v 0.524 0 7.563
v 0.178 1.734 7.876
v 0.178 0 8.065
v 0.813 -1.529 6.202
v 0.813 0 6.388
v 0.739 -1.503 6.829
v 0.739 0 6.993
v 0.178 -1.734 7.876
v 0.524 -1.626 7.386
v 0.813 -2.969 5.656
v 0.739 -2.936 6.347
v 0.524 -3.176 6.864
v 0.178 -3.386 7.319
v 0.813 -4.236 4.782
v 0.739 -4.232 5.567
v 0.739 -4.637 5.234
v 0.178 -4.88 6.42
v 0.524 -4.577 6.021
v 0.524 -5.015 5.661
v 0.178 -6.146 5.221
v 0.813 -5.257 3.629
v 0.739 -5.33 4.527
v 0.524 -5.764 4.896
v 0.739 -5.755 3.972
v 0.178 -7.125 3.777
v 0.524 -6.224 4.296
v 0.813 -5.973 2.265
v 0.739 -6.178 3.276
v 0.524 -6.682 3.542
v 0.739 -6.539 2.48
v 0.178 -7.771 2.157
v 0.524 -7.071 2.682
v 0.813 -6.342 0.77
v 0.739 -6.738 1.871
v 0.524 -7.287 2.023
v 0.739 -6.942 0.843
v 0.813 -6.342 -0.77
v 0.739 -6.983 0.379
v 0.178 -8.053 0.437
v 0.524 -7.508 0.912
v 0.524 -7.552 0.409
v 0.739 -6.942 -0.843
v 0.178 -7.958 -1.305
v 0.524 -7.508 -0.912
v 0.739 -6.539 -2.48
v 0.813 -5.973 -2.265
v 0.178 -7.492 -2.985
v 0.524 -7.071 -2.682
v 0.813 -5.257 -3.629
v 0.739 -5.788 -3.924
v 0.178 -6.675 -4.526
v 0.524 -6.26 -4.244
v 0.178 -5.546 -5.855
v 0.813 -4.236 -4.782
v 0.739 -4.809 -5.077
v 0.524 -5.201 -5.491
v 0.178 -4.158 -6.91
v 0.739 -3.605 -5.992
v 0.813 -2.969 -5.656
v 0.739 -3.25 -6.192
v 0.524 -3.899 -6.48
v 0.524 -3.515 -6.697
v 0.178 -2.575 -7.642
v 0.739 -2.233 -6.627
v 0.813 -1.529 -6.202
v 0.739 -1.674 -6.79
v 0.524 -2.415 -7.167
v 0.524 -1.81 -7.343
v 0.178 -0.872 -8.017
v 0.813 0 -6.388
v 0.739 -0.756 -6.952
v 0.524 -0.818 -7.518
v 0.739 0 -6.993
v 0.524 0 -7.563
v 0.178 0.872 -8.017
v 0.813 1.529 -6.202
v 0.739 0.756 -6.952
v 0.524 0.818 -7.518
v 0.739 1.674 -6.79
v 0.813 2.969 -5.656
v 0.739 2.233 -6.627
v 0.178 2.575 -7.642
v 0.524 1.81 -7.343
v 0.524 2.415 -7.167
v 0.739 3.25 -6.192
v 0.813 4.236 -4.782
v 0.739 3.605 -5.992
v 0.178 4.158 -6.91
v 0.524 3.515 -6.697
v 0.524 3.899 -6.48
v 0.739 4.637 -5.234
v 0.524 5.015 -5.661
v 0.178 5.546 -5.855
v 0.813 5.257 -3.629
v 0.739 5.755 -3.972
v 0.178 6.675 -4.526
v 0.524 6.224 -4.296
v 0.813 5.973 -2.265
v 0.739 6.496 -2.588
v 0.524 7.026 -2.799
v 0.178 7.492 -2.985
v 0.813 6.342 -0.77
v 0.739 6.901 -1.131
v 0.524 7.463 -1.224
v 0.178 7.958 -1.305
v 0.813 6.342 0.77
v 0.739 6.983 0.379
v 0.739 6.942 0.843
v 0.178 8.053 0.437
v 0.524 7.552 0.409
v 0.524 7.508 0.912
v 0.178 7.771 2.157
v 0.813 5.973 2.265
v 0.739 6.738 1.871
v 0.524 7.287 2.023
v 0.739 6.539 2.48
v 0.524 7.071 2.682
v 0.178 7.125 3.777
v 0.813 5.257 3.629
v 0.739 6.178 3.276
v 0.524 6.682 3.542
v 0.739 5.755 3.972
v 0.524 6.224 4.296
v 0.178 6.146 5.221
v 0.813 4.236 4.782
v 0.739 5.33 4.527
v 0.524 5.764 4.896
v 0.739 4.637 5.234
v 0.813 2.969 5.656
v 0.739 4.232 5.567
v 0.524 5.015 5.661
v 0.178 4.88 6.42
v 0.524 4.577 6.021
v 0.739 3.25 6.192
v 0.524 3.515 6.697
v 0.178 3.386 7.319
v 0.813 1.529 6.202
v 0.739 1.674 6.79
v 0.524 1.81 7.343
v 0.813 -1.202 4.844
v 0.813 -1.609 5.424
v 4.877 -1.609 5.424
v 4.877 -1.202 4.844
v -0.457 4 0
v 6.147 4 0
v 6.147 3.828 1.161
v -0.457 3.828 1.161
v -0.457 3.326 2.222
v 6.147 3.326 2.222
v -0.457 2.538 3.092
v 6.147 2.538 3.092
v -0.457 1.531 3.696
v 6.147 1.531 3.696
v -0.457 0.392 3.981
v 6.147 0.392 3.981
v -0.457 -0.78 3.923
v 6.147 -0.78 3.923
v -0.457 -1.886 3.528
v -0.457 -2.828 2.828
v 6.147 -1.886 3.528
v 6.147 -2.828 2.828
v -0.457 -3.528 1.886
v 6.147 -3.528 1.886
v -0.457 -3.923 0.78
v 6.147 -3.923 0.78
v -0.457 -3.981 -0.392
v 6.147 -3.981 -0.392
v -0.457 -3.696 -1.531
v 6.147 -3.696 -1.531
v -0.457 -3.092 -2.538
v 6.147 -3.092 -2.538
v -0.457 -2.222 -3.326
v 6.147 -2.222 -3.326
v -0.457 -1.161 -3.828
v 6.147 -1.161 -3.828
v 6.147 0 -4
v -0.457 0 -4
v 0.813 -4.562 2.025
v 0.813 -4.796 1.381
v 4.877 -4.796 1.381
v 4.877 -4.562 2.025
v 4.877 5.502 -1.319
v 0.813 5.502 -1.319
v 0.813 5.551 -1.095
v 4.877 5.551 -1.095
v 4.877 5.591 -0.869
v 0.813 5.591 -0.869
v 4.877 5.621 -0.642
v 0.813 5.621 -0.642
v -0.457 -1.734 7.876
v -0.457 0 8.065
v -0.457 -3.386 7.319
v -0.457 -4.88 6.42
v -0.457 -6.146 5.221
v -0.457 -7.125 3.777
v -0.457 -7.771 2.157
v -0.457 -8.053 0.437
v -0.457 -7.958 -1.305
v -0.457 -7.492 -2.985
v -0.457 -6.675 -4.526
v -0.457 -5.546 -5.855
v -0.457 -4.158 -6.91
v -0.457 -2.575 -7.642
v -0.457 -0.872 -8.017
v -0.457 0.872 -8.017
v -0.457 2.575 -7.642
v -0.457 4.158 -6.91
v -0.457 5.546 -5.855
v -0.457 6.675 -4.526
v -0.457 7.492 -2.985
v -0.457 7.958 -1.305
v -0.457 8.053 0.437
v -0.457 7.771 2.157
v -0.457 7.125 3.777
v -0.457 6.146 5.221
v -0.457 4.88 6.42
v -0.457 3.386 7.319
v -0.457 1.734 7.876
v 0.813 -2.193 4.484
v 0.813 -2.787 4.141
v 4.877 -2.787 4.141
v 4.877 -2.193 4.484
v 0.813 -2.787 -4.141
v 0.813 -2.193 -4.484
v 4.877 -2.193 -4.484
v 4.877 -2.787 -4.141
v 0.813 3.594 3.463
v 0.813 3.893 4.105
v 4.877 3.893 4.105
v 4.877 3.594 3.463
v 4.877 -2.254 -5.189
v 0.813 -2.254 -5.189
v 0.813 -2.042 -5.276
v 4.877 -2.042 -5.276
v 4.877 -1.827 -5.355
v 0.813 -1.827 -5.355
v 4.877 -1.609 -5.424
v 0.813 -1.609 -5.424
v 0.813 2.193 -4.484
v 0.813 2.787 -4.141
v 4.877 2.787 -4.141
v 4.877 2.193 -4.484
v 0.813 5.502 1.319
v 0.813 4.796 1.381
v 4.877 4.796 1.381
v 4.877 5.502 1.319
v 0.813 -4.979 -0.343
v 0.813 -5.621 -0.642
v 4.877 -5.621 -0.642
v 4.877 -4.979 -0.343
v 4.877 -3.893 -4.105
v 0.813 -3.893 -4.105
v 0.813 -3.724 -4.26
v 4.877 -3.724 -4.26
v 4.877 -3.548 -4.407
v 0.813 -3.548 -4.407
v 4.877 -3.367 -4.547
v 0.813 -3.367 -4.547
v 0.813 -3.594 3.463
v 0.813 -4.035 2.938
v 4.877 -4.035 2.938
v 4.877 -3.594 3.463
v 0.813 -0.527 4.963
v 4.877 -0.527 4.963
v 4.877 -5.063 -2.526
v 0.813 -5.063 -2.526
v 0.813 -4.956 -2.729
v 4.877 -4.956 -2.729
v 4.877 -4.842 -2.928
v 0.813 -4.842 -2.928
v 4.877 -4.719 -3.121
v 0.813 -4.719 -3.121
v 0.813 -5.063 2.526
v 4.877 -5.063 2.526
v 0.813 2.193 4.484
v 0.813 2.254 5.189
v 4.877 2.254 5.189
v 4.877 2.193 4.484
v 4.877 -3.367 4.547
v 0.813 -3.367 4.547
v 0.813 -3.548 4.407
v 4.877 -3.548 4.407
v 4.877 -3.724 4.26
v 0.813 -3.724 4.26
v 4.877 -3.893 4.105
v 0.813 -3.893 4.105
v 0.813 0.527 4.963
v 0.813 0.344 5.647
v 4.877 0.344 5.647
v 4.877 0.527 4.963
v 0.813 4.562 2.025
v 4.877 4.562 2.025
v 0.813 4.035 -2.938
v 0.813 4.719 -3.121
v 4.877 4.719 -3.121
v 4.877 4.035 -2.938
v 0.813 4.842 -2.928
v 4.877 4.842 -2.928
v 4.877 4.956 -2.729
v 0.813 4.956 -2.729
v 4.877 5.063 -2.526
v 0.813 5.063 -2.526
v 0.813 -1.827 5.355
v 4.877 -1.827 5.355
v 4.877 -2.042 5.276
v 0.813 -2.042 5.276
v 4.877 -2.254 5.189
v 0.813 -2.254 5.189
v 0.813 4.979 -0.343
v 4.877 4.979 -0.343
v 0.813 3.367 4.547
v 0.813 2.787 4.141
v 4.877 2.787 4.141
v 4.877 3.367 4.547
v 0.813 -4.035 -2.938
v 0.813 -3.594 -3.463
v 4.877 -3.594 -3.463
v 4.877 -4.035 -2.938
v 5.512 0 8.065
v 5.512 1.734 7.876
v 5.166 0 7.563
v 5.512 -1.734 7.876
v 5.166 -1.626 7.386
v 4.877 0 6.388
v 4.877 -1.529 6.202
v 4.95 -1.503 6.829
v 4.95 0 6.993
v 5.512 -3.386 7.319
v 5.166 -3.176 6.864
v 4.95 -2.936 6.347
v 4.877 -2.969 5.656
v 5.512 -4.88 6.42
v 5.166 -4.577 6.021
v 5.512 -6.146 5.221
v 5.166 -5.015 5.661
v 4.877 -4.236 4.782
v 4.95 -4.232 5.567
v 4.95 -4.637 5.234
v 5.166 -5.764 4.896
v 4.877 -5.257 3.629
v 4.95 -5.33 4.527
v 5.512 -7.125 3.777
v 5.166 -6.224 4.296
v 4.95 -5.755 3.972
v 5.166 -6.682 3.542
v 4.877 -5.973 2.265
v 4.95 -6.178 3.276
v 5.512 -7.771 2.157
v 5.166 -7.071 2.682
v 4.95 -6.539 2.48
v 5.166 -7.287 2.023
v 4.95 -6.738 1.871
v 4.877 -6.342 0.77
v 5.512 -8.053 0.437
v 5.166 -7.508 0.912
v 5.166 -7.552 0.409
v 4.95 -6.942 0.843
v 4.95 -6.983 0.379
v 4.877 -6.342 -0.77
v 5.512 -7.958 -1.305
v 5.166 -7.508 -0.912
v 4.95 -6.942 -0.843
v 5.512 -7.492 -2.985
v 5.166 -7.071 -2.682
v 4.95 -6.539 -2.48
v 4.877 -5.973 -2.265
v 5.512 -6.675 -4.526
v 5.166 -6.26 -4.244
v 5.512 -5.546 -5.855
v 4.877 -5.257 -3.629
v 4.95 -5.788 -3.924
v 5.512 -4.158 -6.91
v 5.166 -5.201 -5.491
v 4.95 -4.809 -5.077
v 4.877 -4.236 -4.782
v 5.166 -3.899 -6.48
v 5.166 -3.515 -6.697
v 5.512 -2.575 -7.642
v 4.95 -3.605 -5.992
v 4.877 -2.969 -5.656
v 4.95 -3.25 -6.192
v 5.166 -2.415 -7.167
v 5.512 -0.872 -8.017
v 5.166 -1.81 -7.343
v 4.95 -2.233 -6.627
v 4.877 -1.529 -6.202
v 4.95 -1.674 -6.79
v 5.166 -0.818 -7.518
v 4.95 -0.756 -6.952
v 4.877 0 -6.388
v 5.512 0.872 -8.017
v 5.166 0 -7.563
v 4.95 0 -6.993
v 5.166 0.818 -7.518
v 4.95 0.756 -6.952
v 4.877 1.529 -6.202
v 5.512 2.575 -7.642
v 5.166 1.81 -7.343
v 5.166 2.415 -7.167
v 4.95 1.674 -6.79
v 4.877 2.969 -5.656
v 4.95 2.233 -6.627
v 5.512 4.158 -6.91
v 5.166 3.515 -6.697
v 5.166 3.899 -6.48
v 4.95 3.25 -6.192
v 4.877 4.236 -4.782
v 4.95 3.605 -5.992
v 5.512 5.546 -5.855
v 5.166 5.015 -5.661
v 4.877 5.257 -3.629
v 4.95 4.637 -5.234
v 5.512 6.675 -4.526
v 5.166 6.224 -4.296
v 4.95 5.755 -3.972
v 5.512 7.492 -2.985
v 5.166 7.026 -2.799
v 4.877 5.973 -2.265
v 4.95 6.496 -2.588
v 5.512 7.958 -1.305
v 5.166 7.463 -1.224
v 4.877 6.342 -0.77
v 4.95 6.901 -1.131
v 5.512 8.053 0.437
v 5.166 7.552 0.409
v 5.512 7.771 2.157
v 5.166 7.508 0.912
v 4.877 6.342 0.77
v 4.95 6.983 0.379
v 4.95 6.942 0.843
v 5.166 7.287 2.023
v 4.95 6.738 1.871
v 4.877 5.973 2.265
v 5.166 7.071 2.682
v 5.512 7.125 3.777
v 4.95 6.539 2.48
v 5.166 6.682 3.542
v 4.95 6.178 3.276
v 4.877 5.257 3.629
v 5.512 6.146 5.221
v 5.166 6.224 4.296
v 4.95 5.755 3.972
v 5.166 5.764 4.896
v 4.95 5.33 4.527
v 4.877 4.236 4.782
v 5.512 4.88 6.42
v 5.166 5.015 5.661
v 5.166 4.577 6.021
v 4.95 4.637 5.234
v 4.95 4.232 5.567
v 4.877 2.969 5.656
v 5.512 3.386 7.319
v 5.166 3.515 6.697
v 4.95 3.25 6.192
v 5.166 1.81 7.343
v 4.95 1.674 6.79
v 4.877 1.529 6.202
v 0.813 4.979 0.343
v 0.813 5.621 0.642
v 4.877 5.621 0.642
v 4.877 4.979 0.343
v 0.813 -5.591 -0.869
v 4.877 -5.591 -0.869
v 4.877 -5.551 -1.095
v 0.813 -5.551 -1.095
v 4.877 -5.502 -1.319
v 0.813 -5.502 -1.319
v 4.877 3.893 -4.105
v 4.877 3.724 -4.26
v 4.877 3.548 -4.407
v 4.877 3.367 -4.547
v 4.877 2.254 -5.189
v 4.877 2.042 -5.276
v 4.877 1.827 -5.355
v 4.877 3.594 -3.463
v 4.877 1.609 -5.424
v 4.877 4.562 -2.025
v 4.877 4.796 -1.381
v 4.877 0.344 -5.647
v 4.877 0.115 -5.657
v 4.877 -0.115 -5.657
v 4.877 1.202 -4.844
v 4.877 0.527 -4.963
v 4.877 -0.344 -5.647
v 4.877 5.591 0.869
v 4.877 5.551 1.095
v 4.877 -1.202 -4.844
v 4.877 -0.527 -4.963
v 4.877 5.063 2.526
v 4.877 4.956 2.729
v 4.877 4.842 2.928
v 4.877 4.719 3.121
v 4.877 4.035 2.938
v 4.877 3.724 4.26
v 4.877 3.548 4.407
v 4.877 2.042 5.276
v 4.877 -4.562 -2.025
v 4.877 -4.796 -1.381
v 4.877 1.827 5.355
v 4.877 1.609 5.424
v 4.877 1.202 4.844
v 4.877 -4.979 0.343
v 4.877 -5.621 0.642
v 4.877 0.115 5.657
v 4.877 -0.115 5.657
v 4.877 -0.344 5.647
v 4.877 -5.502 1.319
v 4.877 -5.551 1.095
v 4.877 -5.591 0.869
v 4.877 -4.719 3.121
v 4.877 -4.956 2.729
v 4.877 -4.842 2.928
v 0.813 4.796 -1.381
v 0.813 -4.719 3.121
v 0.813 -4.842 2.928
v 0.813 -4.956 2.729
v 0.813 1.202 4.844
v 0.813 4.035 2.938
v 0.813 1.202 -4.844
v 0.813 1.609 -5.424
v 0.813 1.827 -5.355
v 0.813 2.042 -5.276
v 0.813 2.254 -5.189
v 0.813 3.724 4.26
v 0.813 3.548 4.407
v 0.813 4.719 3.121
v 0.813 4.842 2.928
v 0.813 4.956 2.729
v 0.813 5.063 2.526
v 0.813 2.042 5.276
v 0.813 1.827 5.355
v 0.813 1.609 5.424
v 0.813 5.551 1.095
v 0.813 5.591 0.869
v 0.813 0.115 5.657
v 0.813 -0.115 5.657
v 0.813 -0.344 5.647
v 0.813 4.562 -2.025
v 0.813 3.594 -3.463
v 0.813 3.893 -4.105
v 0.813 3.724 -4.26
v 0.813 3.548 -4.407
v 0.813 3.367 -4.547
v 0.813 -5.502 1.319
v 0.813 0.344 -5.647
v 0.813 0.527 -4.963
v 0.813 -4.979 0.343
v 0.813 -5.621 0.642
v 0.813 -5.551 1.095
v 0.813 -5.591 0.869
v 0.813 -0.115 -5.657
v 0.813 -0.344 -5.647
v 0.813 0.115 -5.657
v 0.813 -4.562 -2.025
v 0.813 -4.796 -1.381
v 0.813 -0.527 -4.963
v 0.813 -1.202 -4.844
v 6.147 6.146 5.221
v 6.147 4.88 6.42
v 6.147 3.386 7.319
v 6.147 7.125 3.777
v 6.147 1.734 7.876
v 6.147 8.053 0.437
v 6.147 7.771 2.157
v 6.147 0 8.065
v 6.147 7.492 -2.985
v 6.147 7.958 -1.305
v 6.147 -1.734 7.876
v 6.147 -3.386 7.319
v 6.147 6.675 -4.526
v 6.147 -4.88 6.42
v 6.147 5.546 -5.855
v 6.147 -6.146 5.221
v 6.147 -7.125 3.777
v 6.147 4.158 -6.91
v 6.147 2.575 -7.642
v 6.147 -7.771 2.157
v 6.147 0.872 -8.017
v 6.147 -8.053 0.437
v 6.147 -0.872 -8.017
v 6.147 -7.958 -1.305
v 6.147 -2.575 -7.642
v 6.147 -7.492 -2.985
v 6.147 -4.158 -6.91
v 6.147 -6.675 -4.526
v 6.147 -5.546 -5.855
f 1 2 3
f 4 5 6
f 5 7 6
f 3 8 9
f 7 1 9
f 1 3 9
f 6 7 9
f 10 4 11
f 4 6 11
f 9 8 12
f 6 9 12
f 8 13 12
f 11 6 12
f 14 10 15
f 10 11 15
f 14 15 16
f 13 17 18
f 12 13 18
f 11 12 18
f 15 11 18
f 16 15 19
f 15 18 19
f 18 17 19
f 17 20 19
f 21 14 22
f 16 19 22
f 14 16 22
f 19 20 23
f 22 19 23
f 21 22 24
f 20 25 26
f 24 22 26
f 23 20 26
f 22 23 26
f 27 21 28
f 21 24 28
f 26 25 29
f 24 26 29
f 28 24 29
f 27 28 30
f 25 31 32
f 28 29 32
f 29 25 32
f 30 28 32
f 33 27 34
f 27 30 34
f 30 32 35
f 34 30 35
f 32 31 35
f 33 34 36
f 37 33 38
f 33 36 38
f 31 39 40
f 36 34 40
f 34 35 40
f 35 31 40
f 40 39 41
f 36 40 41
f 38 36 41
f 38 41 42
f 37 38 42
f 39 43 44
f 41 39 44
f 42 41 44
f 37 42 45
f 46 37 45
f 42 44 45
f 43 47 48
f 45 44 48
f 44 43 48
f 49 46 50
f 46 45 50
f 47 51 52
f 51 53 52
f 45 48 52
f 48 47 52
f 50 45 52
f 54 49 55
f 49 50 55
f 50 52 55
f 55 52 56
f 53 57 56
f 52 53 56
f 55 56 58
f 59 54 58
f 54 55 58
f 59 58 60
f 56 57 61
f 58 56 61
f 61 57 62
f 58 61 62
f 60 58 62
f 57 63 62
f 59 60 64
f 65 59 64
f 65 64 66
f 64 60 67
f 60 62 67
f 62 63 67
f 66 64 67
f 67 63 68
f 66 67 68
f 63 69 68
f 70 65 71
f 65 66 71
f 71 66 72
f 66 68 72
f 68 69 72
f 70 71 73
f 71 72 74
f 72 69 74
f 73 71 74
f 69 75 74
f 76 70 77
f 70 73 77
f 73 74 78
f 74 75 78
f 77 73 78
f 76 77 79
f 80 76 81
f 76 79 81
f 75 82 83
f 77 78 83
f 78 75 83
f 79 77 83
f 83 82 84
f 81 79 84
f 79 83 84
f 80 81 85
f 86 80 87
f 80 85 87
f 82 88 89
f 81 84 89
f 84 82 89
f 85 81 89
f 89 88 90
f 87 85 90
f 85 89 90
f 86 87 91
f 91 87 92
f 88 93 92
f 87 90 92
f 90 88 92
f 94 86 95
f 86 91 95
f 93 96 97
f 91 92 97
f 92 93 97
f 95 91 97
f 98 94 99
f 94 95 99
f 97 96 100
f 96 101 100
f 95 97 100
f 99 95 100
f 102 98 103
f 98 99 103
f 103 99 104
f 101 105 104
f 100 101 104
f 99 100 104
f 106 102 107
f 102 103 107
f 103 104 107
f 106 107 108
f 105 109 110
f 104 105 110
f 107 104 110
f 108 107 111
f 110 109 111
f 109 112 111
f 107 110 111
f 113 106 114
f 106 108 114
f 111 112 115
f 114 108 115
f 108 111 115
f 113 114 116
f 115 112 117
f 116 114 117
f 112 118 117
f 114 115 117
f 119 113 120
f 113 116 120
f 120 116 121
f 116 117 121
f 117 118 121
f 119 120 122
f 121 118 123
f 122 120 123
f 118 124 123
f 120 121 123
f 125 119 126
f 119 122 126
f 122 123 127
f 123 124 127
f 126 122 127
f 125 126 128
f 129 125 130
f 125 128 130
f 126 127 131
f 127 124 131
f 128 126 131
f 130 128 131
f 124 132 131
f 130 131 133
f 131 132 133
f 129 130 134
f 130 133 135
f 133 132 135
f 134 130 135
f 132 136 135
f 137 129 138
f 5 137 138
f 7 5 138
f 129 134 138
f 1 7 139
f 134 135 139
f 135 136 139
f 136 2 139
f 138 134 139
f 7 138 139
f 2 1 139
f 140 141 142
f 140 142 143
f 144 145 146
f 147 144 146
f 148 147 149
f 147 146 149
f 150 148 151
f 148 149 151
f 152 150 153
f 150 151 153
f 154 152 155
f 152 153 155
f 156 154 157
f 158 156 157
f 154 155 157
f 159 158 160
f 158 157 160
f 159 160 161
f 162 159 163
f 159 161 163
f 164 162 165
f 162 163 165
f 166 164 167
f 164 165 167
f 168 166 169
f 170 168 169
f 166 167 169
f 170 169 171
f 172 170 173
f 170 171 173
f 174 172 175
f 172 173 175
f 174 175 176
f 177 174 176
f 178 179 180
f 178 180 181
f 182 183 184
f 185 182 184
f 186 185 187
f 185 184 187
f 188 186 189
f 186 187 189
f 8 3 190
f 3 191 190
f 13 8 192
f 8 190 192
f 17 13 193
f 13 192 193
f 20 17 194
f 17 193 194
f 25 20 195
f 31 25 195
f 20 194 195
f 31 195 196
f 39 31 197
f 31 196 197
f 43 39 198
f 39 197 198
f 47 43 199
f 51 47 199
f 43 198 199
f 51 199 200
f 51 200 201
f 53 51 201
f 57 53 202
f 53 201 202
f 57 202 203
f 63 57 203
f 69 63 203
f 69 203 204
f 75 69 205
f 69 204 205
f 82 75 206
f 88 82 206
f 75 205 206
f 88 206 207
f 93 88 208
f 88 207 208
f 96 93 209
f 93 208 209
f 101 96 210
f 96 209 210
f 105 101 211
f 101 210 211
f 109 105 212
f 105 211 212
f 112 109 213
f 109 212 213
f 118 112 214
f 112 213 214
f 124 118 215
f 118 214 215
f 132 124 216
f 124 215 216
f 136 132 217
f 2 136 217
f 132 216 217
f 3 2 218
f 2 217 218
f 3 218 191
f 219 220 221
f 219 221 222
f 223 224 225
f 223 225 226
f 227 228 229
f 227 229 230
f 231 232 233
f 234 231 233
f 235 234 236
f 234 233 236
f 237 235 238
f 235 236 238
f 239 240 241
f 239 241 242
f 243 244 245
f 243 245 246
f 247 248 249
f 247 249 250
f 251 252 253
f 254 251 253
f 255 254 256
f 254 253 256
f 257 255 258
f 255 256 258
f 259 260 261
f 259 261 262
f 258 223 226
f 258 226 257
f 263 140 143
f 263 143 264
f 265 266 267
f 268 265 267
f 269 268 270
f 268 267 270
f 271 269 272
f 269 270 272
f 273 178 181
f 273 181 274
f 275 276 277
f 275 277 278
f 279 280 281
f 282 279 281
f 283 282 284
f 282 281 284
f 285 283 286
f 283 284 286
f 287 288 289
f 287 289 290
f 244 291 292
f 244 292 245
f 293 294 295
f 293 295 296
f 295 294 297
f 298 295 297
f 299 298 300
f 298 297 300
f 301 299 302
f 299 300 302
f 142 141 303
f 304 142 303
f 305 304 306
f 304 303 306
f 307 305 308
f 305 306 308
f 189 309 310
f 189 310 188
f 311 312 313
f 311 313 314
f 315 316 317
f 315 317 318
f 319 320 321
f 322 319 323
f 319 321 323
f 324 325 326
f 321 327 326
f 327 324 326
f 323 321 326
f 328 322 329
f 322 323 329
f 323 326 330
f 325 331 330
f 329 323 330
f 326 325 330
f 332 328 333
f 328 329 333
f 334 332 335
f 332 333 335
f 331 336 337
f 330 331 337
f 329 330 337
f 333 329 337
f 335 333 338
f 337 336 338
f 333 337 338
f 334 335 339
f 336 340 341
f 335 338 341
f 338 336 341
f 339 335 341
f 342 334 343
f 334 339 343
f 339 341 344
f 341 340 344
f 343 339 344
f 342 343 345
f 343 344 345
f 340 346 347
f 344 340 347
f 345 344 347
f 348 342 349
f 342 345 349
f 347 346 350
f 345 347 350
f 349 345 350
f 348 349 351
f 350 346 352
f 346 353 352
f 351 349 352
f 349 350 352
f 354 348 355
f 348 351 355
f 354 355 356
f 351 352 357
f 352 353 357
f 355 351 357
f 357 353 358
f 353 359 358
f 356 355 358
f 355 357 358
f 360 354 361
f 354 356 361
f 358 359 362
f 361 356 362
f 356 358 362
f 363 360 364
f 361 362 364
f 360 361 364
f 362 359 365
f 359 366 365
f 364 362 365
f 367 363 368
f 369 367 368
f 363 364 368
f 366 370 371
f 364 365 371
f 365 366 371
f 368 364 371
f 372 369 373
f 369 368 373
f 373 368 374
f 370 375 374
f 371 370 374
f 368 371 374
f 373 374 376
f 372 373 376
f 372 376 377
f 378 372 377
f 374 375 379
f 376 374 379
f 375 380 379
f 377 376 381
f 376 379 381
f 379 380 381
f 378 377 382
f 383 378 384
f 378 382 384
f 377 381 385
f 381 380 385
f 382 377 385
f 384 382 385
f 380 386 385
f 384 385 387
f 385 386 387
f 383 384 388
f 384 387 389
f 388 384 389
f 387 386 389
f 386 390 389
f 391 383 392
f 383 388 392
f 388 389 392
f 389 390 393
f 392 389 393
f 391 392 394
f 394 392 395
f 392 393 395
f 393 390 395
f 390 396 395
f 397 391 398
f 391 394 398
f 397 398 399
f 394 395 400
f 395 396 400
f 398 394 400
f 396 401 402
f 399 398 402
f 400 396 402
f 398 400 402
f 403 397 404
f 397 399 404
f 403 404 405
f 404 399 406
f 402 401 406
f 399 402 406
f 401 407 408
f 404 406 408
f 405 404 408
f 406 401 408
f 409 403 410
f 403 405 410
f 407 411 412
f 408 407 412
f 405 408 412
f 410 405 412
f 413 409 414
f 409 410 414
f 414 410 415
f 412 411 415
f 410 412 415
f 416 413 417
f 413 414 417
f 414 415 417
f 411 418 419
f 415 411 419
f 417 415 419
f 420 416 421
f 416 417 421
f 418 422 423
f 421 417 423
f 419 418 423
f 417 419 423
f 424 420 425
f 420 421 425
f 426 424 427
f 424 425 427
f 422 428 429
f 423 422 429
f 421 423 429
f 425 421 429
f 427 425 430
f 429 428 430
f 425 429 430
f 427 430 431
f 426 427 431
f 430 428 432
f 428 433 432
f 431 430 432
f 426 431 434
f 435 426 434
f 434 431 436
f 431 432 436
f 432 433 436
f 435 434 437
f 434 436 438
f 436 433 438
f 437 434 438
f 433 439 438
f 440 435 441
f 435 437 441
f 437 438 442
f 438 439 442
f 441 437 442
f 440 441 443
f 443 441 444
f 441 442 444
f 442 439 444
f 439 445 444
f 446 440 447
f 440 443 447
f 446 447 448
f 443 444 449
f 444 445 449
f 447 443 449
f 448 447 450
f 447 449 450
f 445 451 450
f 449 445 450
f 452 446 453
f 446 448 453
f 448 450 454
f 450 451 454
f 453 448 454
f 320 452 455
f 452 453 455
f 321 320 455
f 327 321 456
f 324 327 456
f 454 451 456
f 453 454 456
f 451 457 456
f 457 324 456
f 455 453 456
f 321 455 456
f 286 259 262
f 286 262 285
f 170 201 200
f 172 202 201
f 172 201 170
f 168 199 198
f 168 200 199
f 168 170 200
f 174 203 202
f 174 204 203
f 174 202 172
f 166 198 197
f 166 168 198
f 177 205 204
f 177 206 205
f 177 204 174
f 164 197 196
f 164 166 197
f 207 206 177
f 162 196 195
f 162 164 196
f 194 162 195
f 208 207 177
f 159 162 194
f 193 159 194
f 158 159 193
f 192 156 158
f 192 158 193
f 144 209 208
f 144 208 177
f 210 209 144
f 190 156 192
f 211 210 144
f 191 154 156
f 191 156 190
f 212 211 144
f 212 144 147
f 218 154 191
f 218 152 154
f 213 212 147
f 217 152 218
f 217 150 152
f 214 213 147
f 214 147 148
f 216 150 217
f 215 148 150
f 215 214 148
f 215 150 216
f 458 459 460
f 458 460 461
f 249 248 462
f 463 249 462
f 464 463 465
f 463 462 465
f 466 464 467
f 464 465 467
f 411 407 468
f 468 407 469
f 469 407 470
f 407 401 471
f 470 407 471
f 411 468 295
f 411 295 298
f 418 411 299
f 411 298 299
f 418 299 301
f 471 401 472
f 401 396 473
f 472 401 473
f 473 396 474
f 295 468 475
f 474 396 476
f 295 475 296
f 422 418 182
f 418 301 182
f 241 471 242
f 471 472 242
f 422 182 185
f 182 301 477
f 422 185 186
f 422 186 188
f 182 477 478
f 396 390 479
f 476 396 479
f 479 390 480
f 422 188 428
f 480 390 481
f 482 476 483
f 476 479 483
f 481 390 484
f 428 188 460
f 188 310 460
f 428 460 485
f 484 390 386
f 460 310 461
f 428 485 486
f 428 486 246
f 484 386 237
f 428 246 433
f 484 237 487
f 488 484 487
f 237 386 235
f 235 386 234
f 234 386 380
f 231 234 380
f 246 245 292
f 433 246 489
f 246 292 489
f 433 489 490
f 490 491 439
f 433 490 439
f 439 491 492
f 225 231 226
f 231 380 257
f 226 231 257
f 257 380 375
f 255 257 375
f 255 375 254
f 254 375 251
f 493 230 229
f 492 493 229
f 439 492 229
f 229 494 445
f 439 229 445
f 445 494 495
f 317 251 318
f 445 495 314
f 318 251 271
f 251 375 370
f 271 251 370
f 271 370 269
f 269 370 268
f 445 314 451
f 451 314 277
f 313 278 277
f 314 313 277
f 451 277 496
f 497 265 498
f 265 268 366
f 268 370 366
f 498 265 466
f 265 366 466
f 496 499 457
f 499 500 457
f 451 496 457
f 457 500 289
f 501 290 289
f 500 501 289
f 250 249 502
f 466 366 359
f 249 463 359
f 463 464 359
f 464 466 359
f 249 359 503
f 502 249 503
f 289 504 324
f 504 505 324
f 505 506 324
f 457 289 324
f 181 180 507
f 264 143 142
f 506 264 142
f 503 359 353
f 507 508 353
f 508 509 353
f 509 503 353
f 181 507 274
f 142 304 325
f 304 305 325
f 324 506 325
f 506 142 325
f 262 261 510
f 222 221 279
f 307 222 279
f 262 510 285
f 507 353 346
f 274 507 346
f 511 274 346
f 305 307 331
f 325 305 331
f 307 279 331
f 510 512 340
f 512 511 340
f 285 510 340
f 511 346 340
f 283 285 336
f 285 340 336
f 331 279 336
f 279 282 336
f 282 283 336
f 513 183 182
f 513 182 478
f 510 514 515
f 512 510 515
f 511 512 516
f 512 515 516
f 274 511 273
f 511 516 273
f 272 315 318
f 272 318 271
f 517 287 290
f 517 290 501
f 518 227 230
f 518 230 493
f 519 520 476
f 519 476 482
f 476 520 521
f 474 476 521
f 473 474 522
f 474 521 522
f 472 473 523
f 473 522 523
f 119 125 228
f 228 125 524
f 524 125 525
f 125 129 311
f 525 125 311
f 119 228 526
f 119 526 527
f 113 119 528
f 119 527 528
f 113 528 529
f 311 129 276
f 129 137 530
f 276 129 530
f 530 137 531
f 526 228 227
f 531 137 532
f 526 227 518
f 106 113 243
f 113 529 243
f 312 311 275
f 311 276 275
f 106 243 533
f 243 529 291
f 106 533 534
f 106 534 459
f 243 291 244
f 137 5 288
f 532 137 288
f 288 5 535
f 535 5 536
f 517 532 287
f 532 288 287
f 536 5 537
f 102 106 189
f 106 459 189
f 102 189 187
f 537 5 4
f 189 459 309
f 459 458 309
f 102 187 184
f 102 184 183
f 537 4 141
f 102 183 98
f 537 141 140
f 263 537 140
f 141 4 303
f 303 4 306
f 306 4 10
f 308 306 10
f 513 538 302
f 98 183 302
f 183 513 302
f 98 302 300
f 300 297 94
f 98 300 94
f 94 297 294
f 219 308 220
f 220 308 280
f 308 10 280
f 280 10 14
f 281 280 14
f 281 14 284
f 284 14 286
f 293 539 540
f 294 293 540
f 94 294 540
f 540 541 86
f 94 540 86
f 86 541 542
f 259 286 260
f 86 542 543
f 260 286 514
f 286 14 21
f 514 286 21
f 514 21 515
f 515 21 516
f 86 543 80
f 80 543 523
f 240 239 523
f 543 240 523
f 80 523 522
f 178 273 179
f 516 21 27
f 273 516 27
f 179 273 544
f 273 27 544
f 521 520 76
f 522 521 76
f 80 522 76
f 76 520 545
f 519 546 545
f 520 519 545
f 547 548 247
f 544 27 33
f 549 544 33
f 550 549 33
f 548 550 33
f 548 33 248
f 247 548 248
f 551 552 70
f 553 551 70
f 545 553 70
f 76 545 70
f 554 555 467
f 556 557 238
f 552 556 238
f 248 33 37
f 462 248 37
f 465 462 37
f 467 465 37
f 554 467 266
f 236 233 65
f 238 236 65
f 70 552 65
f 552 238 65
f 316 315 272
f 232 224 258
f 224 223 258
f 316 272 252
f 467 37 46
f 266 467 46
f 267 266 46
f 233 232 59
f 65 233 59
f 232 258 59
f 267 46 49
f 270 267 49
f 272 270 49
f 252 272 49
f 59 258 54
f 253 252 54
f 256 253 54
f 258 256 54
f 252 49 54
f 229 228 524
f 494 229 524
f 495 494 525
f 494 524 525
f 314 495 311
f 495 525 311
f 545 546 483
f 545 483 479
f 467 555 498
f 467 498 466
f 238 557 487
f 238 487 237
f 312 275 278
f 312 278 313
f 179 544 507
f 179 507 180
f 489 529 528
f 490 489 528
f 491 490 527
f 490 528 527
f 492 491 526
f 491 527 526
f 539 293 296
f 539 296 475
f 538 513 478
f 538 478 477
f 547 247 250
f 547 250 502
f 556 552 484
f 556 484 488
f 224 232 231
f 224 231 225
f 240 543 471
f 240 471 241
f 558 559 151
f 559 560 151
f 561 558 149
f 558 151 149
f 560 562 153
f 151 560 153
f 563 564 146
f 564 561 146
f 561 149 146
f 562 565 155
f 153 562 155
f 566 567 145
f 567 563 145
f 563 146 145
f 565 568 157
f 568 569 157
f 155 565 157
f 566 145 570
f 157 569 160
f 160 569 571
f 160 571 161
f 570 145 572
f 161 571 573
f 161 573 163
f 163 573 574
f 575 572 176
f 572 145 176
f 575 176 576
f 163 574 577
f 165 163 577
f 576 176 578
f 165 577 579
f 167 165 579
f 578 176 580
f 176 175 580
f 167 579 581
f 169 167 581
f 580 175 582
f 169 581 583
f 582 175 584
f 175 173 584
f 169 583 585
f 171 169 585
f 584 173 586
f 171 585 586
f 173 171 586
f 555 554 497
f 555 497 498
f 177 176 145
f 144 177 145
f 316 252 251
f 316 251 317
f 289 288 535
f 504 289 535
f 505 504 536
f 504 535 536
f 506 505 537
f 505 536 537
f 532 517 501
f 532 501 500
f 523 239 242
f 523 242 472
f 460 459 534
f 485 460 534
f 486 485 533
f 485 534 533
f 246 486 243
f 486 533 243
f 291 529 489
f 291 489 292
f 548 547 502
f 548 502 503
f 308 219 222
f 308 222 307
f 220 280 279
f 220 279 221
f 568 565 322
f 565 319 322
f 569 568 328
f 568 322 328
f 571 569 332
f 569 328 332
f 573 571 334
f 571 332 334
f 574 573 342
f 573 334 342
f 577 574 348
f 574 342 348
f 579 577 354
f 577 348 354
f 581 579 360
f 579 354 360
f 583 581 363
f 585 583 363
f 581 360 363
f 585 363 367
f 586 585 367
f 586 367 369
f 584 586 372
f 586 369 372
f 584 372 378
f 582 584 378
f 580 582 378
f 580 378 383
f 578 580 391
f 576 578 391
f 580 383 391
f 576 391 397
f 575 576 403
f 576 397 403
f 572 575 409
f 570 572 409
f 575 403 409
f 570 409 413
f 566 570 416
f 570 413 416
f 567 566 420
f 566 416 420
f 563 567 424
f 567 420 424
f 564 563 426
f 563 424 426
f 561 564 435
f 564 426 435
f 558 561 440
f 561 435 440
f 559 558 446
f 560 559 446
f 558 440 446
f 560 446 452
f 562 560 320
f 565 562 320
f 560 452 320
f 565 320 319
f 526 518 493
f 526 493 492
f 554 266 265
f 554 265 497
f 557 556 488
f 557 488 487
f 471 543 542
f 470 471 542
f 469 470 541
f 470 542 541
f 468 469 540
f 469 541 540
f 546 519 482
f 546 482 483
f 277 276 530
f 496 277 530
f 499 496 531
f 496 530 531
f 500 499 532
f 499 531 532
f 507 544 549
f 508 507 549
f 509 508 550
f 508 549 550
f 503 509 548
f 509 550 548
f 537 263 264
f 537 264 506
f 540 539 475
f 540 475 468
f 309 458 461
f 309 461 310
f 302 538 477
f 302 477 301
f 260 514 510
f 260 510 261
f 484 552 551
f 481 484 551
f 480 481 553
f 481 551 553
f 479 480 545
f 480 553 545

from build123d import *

# Parameters (mm, degrees)
SKETCH4_R          = 5.8166
SKETCH4_R_2        = 5.65785
CUT_EXTRUDE2_DEPTH = 4.064
CUT_EXTRUDE1_DEPTH = 4.064
CIRPATTERN1_COUNT  = 18
SKETCH6_R          = 1.4605
CUT_EXTRUDE3_DEPTH = 13.95590486
CIRPATTERN2_COUNT  = 2
CIRPATTERN2_ANGLE  = 90
CUT_EXTRUDE5_REACH = 15.179
SKETCH9_R          = 8.0645
CUT_EXTRUDE6_REACH = 15.179
SKETCH10_R         = 2.38125


with BuildPart() as part:
    # Sketch1 → Revolve1 (revolve)
    with BuildSketch(Plane.XY, mode=Mode.PRIVATE) as revolve1_sk:
        with BuildLine():
            Line((-6.1468, 2.38125), (6.1468, 2.38125))
            Line((6.1468, 2.38125), (6.1468, 8.0645))
            Line((6.1468, 8.0645), (5.5118, 8.0645))
            ThreePointArc((5.5118, 8.0645), (5.040869168, 7.284417739), (4.8768, 6.3881))
            Line((4.8768, 6.3881), (4.8768, 5.8166))
            Line((4.8768, 5.8166), (0.8128, 5.8166))
            Line((0.8128, 5.8166), (0.8128, 6.3881))
            ThreePointArc((0.8128, 6.3881), (0.648730832, 7.284417739), (0.1778, 8.0645))
            Line((0.1778, 8.0645), (-0.4572, 8.0645))
            Line((-0.4572, 8.0645), (-0.4572, 3.9624))
            Line((-0.4572, 3.9624), (-6.1468, 3.9624))
            Line((-6.1468, 3.9624), (-6.1468, 2.38125))
        make_face()
    revolve(revolve1_sk.sketch.rotate(Axis((-6.1468, 0, 0), (1, 0, 0)), 90), axis=Axis((-6.1468, 0, 0), (1, 0, 0)))

    # Sketch4 → Cut-Extrude2 (cut)
    with BuildSketch(Plane(origin=(0.8128, 0, 0), x_dir=(0, 0, -1), z_dir=(1, 0, 0))):
        Circle(SKETCH4_R)
        Circle(SKETCH4_R_2, mode=Mode.SUBTRACT)
    extrude(amount=CUT_EXTRUDE2_DEPTH, mode=Mode.SUBTRACT)

    # Sketch3 → Cut-Extrude1 (cut)
    with BuildSketch(Plane(origin=(0.8128, 0, 0), x_dir=(0, 0, -1), z_dir=(1, 0, 0))):
        with BuildLine():
            Line((-0.64235315, 5.621267566), (-0.342998874, 4.97930025))
            Line((-0.342998874, 4.97930025), (0.342998874, 4.97930025))
            Line((0.342998874, 4.97930025), (0.64235315, 5.621267566))
            ThreePointArc((0.64235315, 5.621267566), (0, 5.65785), (-0.64235315, 5.621267566))
        make_face()
    cut_extrude1 = extrude(amount=CUT_EXTRUDE1_DEPTH, mode=Mode.SUBTRACT)

    # CirPattern1: Cut-Extrude1 ×18 about axis
    cirpattern1_axis = Axis((0, 0, 0), (1, 0, 0))
    for i in range(1, CIRPATTERN1_COUNT):
        add(cut_extrude1.rotate(cirpattern1_axis, i * 360 / CIRPATTERN1_COUNT), mode=Mode.SUBTRACT)

    # Sketch6 → Cut-Extrude3 (cut, through all)
    with BuildSketch(Plane(origin=(0, 0, 0), x_dir=(1, 0, 0), z_dir=(0, 1, 0))):
        with Locations(Location((-3.302, 0, 0), (0, 0, 90))):
            Circle(SKETCH6_R)
    cut_extrude3 = extrude(amount=CUT_EXTRUDE3_DEPTH, mode=Mode.SUBTRACT)

    # CirPattern2: Cut-Extrude3 ×2 about axis
    cirpattern2_axis = Axis((-6.1468, 0, 0), (1, 0, 0))
    for i in range(1, CIRPATTERN2_COUNT):
        add(cut_extrude3.rotate(cirpattern2_axis, i * CIRPATTERN2_ANGLE / (CIRPATTERN2_COUNT - 1)), mode=Mode.SUBTRACT)

    # Sketch9 → Cut-Extrude5 (cut, up to next)
    with BuildSketch(Plane.ZY.offset(0.4572), mode=Mode.PRIVATE) as cut_extrude5_sk1:
        Circle(SKETCH9_R)
    cut_extrude5_tool1 = extrude(cut_extrude5_sk1.sketch, amount=CUT_EXTRUDE5_REACH, mode=Mode.PRIVATE) & part.part
    add(cut_extrude5_tool1.solids().sort_by_distance((-0.4572, 0, 0))[0], mode=Mode.SUBTRACT)

    # Sketch10 → Cut-Extrude6 (cut, up to next)
    with BuildSketch(Plane(origin=(6.1468, 0, 0), x_dir=(0, 0, -1), z_dir=(1, 0, 0)), mode=Mode.PRIVATE) as cut_extrude6_sk1:
        with BuildLine():
            Line((4, 0), (0, 4))
            ThreePointArc((0, 4), (-2.828427125, -2.828427125), (4, 0))
        make_face()
        Circle(SKETCH10_R, mode=Mode.SUBTRACT)
    cut_extrude6_tool1 = extrude(cut_extrude6_sk1.sketch, amount=-CUT_EXTRUDE6_REACH, mode=Mode.PRIVATE) & part.part
    add(cut_extrude6_tool1.solids().sort_by_distance((6.1468, 1.92, -1.92))[0], mode=Mode.SUBTRACT)


solid = part.part
